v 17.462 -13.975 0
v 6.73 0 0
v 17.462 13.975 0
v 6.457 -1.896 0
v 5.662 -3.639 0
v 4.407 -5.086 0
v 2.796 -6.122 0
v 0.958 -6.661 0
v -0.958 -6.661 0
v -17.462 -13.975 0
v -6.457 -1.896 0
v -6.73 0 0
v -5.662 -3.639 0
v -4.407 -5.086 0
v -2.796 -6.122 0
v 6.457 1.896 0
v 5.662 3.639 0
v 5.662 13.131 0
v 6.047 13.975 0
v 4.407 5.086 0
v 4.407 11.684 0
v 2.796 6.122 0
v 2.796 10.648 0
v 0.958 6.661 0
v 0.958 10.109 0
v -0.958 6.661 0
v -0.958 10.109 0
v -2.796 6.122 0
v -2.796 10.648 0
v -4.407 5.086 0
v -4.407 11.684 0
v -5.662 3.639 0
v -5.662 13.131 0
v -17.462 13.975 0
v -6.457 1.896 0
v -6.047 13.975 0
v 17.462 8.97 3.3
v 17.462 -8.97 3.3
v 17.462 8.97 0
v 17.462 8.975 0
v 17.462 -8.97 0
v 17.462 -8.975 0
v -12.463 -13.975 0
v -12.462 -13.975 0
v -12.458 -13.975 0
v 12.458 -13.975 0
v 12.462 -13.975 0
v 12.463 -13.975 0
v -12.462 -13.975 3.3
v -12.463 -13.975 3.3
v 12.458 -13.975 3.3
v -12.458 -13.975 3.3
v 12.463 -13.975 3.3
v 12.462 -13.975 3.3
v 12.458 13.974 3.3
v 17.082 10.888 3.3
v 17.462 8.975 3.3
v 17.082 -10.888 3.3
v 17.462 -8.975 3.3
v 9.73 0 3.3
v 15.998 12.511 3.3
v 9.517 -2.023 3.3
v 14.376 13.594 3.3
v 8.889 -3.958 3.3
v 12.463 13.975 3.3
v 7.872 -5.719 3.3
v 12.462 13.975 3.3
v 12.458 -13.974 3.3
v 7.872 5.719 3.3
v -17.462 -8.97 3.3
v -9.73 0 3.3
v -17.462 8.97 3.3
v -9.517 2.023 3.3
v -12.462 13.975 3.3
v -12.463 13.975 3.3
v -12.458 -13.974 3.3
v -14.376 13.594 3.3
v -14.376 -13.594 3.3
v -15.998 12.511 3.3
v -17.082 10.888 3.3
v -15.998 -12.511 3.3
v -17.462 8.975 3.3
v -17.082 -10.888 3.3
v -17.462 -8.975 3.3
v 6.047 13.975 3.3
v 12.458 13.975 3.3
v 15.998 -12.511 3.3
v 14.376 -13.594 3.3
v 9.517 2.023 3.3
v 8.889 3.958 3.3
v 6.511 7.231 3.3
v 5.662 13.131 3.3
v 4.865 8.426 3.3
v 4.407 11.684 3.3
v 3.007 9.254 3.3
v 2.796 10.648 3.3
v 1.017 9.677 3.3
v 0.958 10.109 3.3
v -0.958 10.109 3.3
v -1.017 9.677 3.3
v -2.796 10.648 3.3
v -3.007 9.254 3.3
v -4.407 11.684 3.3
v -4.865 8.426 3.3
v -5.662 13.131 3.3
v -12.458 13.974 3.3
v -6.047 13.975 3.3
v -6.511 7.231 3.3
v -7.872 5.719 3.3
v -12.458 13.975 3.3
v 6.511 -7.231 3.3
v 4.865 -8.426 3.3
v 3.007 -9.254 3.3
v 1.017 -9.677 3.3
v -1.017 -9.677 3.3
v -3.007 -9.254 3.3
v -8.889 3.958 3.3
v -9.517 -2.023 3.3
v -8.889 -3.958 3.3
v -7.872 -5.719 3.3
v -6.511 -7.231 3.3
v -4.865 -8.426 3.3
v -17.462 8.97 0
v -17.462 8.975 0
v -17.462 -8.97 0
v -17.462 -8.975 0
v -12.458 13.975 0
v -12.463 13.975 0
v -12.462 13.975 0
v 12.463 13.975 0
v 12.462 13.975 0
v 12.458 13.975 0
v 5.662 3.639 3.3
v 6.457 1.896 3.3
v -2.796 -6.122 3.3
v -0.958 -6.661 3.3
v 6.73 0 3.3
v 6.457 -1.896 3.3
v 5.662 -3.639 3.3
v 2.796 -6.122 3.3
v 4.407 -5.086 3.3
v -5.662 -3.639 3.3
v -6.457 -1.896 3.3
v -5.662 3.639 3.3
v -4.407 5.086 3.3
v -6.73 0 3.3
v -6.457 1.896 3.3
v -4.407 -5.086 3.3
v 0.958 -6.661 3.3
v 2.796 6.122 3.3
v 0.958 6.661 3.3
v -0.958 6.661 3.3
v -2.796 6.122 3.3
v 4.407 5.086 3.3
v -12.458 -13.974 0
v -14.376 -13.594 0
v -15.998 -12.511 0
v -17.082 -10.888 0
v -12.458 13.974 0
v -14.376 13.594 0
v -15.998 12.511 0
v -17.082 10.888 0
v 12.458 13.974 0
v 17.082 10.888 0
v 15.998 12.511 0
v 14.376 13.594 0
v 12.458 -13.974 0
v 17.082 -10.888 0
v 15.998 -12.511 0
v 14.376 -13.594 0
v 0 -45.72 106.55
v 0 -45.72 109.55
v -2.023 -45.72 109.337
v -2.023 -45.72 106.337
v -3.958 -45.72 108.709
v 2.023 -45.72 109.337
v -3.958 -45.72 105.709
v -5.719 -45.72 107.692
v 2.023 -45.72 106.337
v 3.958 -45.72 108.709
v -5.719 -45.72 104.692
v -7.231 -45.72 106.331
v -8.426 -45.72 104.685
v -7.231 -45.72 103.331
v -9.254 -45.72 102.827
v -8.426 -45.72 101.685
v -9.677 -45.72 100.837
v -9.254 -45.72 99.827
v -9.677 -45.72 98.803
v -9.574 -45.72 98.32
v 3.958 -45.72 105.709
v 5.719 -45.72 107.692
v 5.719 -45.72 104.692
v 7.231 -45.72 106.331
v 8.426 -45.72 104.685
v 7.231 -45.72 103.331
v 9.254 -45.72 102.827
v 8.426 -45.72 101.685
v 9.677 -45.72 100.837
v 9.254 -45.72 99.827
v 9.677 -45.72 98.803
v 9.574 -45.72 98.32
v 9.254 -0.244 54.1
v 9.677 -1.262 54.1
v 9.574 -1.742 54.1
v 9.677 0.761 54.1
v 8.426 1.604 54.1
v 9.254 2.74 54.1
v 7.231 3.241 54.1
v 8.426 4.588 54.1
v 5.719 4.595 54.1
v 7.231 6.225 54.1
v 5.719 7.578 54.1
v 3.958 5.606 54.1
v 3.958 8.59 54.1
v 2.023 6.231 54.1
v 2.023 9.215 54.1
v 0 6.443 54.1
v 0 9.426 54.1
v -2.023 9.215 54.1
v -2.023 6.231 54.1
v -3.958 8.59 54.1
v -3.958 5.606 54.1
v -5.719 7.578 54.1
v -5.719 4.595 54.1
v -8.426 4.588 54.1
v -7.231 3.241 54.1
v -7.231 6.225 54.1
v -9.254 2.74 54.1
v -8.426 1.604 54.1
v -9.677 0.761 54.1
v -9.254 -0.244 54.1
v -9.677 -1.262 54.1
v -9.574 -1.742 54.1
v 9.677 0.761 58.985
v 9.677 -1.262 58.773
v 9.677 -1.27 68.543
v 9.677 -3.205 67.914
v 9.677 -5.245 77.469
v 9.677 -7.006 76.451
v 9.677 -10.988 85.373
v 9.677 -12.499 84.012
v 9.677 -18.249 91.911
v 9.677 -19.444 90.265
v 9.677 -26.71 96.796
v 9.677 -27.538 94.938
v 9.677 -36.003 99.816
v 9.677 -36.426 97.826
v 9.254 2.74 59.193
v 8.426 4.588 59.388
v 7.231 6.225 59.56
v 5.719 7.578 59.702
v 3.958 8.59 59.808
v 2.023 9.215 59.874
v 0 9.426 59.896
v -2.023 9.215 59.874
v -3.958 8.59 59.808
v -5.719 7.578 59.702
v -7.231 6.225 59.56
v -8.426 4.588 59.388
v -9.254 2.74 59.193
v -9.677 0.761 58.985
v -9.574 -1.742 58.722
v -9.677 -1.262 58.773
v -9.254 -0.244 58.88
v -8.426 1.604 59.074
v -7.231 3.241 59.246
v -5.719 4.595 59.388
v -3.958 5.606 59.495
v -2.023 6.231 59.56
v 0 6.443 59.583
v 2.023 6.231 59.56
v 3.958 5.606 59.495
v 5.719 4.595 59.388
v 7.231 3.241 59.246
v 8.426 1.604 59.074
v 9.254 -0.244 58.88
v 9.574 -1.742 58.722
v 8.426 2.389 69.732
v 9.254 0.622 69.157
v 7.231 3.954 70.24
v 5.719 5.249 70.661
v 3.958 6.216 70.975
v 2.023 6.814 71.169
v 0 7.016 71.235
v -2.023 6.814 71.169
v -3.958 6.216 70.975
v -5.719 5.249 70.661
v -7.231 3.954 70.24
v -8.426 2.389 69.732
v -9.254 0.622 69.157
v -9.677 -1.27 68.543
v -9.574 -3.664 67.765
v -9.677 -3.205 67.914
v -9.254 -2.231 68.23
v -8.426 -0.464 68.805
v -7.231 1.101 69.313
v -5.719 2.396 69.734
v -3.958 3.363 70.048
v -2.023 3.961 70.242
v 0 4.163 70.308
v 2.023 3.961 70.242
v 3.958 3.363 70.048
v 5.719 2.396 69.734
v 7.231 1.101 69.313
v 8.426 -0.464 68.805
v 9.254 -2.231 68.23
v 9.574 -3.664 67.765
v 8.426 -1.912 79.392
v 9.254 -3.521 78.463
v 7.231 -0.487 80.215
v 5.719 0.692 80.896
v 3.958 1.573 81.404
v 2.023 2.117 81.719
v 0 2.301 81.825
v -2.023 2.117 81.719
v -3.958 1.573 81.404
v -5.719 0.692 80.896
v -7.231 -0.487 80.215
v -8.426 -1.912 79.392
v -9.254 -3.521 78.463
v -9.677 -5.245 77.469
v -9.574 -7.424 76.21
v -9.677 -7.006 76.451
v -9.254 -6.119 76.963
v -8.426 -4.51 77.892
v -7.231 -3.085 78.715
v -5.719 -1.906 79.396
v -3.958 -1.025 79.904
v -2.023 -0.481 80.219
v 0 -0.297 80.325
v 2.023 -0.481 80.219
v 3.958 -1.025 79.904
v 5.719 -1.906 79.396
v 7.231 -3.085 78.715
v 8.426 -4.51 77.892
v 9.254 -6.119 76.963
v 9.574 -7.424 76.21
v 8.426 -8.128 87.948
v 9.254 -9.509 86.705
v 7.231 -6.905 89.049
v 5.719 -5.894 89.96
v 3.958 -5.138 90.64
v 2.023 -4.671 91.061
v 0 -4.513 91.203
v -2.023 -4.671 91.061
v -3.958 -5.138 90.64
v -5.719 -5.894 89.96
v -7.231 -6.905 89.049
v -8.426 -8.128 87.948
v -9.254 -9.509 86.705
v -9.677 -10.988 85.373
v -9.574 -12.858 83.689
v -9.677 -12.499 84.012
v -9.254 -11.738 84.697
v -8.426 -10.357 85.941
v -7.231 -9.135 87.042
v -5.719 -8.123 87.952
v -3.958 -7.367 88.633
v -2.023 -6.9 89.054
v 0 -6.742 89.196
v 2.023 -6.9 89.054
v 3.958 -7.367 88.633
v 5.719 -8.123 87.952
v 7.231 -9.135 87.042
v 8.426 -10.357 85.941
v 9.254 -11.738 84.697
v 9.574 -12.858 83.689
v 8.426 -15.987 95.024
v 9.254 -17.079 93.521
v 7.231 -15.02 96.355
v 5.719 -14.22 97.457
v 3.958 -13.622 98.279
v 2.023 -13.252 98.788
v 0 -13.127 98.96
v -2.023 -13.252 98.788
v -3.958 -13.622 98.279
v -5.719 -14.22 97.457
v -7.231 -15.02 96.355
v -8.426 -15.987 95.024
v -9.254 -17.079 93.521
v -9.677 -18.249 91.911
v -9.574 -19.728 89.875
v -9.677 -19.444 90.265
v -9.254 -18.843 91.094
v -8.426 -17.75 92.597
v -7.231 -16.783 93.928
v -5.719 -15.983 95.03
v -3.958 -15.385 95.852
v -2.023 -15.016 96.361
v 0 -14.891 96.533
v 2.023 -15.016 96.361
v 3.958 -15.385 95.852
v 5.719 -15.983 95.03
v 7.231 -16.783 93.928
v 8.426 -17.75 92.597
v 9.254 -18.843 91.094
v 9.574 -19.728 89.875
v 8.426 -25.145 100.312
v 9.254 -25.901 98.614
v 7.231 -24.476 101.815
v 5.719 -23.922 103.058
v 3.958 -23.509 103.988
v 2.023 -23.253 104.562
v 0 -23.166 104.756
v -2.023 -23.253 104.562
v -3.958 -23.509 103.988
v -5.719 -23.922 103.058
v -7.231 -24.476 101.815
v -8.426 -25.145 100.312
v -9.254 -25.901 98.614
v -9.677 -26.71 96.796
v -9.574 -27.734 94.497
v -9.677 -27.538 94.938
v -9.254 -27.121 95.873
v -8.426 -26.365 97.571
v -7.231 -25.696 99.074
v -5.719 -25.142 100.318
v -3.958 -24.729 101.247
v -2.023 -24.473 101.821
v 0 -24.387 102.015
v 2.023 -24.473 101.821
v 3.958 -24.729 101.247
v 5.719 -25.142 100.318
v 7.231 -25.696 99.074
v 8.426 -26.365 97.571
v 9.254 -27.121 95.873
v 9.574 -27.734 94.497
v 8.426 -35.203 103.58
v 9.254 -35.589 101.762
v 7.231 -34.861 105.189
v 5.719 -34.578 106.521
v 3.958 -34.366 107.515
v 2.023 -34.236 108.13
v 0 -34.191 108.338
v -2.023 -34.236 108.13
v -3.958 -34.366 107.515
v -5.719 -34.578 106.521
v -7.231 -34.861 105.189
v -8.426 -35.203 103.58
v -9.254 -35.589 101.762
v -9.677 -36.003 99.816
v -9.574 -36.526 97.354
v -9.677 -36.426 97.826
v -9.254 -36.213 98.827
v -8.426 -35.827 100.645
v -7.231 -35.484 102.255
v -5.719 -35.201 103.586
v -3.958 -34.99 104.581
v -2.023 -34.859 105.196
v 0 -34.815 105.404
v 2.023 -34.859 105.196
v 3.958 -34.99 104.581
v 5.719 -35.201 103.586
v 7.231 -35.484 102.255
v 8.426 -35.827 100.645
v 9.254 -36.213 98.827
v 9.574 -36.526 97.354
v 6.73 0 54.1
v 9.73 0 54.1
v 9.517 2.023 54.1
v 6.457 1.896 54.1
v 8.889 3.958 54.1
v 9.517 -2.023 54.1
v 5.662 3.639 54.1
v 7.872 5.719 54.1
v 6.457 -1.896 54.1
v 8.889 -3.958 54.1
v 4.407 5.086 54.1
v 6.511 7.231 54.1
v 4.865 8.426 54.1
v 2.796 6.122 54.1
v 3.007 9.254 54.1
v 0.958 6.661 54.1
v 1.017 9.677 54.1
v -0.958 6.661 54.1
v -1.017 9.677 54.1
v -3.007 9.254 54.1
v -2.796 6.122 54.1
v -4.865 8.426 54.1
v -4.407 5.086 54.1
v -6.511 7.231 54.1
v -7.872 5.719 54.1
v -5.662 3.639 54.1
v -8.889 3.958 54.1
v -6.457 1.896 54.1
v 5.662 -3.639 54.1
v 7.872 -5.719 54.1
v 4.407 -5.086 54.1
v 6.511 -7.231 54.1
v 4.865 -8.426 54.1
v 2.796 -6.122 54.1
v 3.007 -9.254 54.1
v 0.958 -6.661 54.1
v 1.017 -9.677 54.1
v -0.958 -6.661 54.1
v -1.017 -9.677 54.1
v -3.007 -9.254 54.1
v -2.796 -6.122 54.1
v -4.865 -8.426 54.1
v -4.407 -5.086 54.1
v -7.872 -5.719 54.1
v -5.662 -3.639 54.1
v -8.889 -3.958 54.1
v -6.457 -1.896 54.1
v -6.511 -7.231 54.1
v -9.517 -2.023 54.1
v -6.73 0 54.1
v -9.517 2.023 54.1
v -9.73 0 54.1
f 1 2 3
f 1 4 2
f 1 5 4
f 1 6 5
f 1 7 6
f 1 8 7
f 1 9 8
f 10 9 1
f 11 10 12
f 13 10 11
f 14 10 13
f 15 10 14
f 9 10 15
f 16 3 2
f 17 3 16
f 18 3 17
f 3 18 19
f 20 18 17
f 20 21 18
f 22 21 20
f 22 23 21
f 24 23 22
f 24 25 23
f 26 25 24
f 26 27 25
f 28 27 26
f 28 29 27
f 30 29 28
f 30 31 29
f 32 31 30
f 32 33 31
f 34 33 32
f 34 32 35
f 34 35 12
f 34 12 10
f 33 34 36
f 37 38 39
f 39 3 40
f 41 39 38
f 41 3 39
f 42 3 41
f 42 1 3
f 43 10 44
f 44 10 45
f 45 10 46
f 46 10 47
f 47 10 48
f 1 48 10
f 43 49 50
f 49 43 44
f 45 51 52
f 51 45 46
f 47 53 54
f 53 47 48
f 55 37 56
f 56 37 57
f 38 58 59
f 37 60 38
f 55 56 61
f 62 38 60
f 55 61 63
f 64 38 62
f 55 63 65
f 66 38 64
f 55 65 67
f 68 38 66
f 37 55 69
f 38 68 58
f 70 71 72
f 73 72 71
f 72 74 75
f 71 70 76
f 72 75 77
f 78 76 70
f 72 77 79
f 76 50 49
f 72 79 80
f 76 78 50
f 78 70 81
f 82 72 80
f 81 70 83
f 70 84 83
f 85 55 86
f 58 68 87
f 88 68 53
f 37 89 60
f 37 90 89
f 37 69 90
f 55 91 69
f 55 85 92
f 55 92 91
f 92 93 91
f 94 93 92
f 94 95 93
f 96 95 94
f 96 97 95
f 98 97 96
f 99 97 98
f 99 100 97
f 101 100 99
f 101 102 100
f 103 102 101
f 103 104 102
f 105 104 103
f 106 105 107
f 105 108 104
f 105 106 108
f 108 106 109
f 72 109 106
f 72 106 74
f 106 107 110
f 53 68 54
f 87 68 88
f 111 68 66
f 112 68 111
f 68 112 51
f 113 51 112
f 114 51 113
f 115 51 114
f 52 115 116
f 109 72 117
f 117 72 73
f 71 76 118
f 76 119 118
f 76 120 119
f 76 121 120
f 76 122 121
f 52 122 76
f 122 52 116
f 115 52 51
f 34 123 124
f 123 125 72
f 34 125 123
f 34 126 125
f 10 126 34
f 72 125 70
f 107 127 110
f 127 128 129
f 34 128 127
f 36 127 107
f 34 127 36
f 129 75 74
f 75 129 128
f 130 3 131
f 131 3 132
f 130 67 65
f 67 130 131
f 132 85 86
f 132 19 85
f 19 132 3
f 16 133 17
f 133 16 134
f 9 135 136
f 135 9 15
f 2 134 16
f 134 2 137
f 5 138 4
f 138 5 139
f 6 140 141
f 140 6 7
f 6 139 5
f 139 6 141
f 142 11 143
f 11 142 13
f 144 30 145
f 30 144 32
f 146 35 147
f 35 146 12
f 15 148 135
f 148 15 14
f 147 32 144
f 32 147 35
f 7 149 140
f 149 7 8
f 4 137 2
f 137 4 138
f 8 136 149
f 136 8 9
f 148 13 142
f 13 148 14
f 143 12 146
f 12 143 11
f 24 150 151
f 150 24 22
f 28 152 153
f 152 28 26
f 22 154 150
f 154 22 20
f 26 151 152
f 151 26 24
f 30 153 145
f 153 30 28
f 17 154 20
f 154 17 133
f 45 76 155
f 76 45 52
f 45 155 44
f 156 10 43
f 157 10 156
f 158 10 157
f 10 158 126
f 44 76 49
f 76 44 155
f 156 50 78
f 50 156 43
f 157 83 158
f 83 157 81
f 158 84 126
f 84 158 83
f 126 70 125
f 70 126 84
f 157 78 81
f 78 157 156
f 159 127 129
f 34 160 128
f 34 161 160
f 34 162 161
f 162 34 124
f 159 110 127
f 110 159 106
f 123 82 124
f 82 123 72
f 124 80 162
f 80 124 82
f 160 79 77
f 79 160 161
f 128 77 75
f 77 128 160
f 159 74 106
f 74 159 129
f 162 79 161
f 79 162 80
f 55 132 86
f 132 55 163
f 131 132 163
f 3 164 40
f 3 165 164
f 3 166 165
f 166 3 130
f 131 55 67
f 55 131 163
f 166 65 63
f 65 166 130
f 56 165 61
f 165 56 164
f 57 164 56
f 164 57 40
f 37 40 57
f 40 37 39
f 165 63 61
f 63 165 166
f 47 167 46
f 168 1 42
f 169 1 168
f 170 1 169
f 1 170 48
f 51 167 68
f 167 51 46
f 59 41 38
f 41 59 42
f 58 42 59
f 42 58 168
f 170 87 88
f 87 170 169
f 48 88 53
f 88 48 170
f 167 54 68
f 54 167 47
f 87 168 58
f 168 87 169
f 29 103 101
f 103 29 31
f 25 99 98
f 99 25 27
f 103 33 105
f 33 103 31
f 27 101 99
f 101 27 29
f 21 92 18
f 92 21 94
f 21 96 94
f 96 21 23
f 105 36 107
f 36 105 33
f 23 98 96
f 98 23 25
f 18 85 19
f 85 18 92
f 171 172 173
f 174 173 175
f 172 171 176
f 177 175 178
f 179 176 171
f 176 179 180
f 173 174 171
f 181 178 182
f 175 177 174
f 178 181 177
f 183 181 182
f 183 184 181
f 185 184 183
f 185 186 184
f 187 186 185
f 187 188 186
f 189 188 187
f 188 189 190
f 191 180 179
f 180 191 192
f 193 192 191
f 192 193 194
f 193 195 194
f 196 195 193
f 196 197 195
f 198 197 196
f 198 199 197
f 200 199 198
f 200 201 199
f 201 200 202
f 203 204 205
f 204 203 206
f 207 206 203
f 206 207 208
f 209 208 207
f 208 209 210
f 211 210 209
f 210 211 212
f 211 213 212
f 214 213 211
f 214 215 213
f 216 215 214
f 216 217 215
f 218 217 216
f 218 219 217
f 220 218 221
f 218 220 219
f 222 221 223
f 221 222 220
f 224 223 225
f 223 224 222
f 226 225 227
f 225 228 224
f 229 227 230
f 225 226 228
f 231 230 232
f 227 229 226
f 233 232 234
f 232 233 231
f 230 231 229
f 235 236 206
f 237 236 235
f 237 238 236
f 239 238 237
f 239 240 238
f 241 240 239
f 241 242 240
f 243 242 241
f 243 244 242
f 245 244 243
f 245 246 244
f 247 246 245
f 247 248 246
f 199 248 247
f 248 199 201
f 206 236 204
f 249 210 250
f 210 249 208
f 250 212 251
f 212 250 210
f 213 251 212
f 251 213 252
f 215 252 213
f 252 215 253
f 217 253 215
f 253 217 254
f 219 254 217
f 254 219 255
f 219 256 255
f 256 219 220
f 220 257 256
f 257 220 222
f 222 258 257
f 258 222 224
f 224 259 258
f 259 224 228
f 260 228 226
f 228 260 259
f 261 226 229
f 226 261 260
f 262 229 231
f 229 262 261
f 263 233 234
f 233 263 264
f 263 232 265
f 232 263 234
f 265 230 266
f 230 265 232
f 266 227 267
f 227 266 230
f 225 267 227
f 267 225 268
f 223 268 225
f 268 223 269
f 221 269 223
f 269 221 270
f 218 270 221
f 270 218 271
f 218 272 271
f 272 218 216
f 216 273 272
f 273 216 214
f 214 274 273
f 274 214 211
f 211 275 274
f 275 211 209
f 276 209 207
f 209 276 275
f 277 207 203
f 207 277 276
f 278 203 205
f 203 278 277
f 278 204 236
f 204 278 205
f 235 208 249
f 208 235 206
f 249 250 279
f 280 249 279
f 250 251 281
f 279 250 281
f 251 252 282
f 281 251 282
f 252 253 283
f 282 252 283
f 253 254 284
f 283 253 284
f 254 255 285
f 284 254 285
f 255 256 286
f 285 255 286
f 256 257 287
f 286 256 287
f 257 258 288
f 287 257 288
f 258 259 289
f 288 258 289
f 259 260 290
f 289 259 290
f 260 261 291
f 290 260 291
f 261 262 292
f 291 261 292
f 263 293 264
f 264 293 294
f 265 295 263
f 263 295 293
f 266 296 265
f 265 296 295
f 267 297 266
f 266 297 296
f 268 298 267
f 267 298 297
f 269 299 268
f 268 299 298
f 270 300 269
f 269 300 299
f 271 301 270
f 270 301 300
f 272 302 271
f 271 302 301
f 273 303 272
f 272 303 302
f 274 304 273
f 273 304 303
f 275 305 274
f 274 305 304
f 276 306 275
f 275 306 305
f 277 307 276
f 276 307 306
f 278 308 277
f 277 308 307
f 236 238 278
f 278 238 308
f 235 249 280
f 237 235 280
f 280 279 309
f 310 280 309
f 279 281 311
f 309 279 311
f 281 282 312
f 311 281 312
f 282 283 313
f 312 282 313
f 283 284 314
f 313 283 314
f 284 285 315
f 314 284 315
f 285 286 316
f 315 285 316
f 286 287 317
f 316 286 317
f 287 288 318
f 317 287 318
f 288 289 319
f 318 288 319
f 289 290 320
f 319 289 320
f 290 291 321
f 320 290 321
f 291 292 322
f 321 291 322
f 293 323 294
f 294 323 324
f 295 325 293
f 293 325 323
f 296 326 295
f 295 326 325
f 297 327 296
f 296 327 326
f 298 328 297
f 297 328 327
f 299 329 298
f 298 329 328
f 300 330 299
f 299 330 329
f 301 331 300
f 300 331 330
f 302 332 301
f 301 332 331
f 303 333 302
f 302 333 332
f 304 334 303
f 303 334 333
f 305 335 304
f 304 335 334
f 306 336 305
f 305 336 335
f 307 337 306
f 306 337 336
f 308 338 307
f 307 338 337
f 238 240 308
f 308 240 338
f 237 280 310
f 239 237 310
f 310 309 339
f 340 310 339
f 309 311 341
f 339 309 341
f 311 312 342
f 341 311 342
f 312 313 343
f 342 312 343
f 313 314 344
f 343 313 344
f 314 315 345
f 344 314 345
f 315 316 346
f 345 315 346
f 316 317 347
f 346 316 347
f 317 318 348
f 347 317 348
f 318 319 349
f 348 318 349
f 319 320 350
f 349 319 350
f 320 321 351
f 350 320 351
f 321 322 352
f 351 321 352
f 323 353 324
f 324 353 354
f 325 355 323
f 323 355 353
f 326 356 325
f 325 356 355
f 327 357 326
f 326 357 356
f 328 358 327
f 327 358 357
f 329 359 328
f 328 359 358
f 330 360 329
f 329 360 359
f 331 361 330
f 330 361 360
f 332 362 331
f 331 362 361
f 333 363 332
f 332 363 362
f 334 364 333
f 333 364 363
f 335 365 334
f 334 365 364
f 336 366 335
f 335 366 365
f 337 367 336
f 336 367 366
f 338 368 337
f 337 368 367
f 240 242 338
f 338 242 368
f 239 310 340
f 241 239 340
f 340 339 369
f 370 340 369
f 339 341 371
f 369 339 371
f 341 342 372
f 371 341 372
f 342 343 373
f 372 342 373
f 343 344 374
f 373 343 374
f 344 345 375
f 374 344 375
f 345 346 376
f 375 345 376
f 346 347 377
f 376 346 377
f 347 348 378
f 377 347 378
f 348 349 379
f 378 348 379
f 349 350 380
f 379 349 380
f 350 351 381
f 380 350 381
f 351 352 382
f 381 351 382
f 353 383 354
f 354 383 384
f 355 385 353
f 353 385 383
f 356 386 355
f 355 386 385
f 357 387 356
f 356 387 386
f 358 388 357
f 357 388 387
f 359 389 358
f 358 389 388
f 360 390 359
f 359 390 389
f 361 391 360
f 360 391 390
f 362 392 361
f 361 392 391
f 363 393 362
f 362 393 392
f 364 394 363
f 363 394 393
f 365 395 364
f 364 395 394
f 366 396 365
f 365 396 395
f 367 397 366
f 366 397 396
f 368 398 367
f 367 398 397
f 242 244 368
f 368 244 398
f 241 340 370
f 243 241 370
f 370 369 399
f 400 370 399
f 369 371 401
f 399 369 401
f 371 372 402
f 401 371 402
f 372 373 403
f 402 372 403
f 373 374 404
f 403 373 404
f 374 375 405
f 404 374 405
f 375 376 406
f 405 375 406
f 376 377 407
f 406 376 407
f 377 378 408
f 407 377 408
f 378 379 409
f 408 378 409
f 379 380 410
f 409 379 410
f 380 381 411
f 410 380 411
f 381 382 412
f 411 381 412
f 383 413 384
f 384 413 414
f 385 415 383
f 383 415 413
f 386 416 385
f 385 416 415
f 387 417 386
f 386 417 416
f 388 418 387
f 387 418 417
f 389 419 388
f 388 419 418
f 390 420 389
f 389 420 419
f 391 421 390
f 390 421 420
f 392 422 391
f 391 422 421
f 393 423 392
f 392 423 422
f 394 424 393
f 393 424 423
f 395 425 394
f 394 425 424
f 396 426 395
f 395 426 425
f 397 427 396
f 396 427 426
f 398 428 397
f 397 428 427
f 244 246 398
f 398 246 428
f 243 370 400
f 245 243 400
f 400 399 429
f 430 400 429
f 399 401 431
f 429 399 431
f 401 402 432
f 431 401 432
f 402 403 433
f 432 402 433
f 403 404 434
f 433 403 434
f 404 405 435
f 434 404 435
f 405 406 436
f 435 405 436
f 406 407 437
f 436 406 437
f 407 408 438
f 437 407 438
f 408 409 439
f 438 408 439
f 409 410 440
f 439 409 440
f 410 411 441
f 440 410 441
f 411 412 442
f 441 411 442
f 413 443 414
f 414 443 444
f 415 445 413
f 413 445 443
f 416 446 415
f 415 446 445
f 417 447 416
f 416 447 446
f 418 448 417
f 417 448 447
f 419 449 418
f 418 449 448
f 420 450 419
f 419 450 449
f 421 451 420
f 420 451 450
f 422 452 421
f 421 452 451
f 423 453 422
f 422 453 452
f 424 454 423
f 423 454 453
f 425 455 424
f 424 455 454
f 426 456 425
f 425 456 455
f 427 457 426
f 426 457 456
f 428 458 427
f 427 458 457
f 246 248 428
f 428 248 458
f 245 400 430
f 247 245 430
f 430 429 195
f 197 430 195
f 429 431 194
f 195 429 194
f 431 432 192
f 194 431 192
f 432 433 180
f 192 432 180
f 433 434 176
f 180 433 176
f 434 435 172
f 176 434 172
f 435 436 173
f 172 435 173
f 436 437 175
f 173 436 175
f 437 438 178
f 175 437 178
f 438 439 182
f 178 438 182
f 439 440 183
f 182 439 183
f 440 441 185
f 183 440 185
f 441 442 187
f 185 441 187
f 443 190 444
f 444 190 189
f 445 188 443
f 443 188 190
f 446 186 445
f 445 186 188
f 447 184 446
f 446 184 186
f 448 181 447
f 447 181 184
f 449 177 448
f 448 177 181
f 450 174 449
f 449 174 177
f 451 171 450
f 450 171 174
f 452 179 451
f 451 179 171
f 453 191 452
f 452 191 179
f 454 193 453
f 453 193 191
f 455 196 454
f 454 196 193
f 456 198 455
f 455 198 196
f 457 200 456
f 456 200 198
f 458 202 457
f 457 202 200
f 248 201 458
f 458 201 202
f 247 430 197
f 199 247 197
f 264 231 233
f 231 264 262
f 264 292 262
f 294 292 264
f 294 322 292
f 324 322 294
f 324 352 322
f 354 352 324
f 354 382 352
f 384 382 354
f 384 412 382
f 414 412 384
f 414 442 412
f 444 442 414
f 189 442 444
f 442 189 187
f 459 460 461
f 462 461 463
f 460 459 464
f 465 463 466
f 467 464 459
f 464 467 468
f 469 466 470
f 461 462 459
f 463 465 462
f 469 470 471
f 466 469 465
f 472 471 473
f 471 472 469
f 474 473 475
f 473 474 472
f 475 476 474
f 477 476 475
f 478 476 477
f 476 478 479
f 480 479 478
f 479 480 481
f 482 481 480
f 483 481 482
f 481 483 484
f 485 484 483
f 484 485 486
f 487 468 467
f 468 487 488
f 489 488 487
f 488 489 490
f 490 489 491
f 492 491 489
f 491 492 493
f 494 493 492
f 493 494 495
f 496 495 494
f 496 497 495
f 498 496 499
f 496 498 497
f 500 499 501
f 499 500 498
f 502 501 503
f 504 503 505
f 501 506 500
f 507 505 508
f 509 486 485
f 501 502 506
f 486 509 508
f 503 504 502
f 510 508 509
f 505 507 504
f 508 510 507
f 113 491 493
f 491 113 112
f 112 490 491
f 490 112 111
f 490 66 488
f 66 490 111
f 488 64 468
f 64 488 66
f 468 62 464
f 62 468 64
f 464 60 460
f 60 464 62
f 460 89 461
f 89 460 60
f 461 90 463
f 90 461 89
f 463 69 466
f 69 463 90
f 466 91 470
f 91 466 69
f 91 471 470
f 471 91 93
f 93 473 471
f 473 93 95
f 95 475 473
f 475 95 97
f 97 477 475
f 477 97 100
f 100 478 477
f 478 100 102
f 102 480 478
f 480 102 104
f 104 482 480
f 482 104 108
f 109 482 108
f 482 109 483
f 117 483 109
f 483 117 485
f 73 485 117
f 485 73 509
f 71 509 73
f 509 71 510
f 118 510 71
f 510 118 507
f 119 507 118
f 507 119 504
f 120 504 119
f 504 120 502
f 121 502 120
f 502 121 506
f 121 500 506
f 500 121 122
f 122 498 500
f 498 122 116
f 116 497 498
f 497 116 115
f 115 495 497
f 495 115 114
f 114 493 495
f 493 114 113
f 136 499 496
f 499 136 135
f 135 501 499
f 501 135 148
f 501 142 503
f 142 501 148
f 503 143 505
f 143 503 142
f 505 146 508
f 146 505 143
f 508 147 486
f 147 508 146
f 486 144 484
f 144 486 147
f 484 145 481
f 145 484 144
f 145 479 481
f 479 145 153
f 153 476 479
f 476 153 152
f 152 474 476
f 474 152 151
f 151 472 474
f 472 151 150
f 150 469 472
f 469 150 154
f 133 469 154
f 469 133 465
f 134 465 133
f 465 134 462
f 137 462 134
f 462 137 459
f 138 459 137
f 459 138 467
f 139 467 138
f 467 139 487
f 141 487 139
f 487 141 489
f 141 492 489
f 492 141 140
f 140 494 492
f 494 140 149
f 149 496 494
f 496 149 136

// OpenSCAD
//Numbers are unitless, but can be interpreted as units in Skeinforge.  Using mm for all these measurements.

// CRITICAL VARS
plateHoleD = 13.46;
tubeP1Length = 50.8;

// Variables
plateW = 34.925;
plateH = 27.95;
plateT = 3.3;
wallThickness = 3;
tubeOuterRad = plateHoleD/2+wallThickness;
angleRadius = 45.72;
partialAngle = 90;


// Plate
difference(){
	difference(){
		linear_extrude(height = plateT, center = false, scale = 1.0)
		polygon(points = [[plateW/2, plateH/2], [plateW/2, -plateH/2], [-plateW/2, -plateH/2],[-plateW/2, plateH/2]]);
			
		linear_extrude(height = plateT, center = false, scale = 1.0)
		circle(plateHoleD/2);
	}


	translate([-plateW/2,-plateH/2,plateT/2])
	fillet(5,plateT)
	difference(){
		linear_extrude(height = plateT, center = false, scale = 1.0)
		polygon(points = [[plateW/2, plateH/2], [plateW/2, -plateH/2], [-plateW/2, -plateH/2],[-plateW/2, plateH/2]]);
			
		linear_extrude(height = plateT, center = false, scale = 1.0)
		circle(plateHoleD/2);
	}

	translate([-plateW/2,plateH/2,plateT/2])
	rotate([0,0,-90])
	fillet(5,plateT)
	difference(){
		linear_extrude(height = plateT, center = false, scale = 1.0)
		polygon(points = [[plateW/2, plateH/2], [plateW/2, -plateH/2], [-plateW/2, -plateH/2],[-plateW/2, plateH/2]]);
			
		linear_extrude(height = plateT, center = false, scale = 1.0)
		circle(plateHoleD/2);
	}

	translate([plateW/2,plateH/2,plateT/2])
	rotate([0,0,180])
	fillet(5,plateT)
	difference(){
		linear_extrude(height = plateT, center = false)
		polygon(points = [[plateW/2, plateH/2], [plateW/2, -plateH/2], [-plateW/2, -plateH/2],[-plateW/2, plateH/2]]);
			
		linear_extrude(height = plateT, center = false)
		circle(plateHoleD/2);
	}

	translate([plateW/2,-plateH/2,plateT/2])
	rotate([0,0,90])
	fillet(5,plateT)
	difference(){
		linear_extrude(height = plateT, center = false)
		polygon(points = [[plateW/2, plateH/2], [plateW/2, -plateH/2], [-plateW/2, -plateH/2],[-plateW/2, plateH/2]]);
			
		linear_extrude(height = plateT, center = false)
		circle(plateHoleD/2);
	}

	translate([0,0.6*plateH,0])
	linear_extrude(height = plateT, center = false)
	circle((plateHoleD/2));

}





// Tube Part 1
translate([0,0,plateT])
linear_extrude(height = tubeP1Length, center = false, scale = 1.0)
difference(){
	circle(tubeOuterRad);
	circle(plateHoleD/2);
}


// Tube Part 2
translate([0,-angleRadius,plateT+tubeP1Length])
rotate([0,-90,0])
partial_rotate_extrude(partialAngle, angleRadius, 10)
difference(){
	circle(tubeOuterRad);
	translate([-wallThickness,0,0]) circle(tubeOuterRad);
}


/******* MODULES *******/

module pie_slice(radius, angle, step) {
	for(theta = [0:step:angle-step]) {
		rotate([0,0,0]) linear_extrude(height = radius*2, center=true)
		polygon( points = [[0,0],[radius * cos(theta+step) ,radius * sin(theta+step)],[radius*cos(theta),radius*sin(theta)]]);
	}
}

module partial_rotate_extrude(angle, radius, convex) {
	intersection () {
		rotate_extrude(convexity=convex) translate([radius,0,0]) child(0);
		pie_slice(radius*2, angle, angle/5);
	}
}

module fillet(r, h) {
    translate([r / 2, r / 2, 0])

        difference() {
            cube([r + 0.01, r + 0.01, h], center = true);

            translate([r/2, r/2, 0])
                cylinder(r = r, h = h + 1, center = true);

        }
}
